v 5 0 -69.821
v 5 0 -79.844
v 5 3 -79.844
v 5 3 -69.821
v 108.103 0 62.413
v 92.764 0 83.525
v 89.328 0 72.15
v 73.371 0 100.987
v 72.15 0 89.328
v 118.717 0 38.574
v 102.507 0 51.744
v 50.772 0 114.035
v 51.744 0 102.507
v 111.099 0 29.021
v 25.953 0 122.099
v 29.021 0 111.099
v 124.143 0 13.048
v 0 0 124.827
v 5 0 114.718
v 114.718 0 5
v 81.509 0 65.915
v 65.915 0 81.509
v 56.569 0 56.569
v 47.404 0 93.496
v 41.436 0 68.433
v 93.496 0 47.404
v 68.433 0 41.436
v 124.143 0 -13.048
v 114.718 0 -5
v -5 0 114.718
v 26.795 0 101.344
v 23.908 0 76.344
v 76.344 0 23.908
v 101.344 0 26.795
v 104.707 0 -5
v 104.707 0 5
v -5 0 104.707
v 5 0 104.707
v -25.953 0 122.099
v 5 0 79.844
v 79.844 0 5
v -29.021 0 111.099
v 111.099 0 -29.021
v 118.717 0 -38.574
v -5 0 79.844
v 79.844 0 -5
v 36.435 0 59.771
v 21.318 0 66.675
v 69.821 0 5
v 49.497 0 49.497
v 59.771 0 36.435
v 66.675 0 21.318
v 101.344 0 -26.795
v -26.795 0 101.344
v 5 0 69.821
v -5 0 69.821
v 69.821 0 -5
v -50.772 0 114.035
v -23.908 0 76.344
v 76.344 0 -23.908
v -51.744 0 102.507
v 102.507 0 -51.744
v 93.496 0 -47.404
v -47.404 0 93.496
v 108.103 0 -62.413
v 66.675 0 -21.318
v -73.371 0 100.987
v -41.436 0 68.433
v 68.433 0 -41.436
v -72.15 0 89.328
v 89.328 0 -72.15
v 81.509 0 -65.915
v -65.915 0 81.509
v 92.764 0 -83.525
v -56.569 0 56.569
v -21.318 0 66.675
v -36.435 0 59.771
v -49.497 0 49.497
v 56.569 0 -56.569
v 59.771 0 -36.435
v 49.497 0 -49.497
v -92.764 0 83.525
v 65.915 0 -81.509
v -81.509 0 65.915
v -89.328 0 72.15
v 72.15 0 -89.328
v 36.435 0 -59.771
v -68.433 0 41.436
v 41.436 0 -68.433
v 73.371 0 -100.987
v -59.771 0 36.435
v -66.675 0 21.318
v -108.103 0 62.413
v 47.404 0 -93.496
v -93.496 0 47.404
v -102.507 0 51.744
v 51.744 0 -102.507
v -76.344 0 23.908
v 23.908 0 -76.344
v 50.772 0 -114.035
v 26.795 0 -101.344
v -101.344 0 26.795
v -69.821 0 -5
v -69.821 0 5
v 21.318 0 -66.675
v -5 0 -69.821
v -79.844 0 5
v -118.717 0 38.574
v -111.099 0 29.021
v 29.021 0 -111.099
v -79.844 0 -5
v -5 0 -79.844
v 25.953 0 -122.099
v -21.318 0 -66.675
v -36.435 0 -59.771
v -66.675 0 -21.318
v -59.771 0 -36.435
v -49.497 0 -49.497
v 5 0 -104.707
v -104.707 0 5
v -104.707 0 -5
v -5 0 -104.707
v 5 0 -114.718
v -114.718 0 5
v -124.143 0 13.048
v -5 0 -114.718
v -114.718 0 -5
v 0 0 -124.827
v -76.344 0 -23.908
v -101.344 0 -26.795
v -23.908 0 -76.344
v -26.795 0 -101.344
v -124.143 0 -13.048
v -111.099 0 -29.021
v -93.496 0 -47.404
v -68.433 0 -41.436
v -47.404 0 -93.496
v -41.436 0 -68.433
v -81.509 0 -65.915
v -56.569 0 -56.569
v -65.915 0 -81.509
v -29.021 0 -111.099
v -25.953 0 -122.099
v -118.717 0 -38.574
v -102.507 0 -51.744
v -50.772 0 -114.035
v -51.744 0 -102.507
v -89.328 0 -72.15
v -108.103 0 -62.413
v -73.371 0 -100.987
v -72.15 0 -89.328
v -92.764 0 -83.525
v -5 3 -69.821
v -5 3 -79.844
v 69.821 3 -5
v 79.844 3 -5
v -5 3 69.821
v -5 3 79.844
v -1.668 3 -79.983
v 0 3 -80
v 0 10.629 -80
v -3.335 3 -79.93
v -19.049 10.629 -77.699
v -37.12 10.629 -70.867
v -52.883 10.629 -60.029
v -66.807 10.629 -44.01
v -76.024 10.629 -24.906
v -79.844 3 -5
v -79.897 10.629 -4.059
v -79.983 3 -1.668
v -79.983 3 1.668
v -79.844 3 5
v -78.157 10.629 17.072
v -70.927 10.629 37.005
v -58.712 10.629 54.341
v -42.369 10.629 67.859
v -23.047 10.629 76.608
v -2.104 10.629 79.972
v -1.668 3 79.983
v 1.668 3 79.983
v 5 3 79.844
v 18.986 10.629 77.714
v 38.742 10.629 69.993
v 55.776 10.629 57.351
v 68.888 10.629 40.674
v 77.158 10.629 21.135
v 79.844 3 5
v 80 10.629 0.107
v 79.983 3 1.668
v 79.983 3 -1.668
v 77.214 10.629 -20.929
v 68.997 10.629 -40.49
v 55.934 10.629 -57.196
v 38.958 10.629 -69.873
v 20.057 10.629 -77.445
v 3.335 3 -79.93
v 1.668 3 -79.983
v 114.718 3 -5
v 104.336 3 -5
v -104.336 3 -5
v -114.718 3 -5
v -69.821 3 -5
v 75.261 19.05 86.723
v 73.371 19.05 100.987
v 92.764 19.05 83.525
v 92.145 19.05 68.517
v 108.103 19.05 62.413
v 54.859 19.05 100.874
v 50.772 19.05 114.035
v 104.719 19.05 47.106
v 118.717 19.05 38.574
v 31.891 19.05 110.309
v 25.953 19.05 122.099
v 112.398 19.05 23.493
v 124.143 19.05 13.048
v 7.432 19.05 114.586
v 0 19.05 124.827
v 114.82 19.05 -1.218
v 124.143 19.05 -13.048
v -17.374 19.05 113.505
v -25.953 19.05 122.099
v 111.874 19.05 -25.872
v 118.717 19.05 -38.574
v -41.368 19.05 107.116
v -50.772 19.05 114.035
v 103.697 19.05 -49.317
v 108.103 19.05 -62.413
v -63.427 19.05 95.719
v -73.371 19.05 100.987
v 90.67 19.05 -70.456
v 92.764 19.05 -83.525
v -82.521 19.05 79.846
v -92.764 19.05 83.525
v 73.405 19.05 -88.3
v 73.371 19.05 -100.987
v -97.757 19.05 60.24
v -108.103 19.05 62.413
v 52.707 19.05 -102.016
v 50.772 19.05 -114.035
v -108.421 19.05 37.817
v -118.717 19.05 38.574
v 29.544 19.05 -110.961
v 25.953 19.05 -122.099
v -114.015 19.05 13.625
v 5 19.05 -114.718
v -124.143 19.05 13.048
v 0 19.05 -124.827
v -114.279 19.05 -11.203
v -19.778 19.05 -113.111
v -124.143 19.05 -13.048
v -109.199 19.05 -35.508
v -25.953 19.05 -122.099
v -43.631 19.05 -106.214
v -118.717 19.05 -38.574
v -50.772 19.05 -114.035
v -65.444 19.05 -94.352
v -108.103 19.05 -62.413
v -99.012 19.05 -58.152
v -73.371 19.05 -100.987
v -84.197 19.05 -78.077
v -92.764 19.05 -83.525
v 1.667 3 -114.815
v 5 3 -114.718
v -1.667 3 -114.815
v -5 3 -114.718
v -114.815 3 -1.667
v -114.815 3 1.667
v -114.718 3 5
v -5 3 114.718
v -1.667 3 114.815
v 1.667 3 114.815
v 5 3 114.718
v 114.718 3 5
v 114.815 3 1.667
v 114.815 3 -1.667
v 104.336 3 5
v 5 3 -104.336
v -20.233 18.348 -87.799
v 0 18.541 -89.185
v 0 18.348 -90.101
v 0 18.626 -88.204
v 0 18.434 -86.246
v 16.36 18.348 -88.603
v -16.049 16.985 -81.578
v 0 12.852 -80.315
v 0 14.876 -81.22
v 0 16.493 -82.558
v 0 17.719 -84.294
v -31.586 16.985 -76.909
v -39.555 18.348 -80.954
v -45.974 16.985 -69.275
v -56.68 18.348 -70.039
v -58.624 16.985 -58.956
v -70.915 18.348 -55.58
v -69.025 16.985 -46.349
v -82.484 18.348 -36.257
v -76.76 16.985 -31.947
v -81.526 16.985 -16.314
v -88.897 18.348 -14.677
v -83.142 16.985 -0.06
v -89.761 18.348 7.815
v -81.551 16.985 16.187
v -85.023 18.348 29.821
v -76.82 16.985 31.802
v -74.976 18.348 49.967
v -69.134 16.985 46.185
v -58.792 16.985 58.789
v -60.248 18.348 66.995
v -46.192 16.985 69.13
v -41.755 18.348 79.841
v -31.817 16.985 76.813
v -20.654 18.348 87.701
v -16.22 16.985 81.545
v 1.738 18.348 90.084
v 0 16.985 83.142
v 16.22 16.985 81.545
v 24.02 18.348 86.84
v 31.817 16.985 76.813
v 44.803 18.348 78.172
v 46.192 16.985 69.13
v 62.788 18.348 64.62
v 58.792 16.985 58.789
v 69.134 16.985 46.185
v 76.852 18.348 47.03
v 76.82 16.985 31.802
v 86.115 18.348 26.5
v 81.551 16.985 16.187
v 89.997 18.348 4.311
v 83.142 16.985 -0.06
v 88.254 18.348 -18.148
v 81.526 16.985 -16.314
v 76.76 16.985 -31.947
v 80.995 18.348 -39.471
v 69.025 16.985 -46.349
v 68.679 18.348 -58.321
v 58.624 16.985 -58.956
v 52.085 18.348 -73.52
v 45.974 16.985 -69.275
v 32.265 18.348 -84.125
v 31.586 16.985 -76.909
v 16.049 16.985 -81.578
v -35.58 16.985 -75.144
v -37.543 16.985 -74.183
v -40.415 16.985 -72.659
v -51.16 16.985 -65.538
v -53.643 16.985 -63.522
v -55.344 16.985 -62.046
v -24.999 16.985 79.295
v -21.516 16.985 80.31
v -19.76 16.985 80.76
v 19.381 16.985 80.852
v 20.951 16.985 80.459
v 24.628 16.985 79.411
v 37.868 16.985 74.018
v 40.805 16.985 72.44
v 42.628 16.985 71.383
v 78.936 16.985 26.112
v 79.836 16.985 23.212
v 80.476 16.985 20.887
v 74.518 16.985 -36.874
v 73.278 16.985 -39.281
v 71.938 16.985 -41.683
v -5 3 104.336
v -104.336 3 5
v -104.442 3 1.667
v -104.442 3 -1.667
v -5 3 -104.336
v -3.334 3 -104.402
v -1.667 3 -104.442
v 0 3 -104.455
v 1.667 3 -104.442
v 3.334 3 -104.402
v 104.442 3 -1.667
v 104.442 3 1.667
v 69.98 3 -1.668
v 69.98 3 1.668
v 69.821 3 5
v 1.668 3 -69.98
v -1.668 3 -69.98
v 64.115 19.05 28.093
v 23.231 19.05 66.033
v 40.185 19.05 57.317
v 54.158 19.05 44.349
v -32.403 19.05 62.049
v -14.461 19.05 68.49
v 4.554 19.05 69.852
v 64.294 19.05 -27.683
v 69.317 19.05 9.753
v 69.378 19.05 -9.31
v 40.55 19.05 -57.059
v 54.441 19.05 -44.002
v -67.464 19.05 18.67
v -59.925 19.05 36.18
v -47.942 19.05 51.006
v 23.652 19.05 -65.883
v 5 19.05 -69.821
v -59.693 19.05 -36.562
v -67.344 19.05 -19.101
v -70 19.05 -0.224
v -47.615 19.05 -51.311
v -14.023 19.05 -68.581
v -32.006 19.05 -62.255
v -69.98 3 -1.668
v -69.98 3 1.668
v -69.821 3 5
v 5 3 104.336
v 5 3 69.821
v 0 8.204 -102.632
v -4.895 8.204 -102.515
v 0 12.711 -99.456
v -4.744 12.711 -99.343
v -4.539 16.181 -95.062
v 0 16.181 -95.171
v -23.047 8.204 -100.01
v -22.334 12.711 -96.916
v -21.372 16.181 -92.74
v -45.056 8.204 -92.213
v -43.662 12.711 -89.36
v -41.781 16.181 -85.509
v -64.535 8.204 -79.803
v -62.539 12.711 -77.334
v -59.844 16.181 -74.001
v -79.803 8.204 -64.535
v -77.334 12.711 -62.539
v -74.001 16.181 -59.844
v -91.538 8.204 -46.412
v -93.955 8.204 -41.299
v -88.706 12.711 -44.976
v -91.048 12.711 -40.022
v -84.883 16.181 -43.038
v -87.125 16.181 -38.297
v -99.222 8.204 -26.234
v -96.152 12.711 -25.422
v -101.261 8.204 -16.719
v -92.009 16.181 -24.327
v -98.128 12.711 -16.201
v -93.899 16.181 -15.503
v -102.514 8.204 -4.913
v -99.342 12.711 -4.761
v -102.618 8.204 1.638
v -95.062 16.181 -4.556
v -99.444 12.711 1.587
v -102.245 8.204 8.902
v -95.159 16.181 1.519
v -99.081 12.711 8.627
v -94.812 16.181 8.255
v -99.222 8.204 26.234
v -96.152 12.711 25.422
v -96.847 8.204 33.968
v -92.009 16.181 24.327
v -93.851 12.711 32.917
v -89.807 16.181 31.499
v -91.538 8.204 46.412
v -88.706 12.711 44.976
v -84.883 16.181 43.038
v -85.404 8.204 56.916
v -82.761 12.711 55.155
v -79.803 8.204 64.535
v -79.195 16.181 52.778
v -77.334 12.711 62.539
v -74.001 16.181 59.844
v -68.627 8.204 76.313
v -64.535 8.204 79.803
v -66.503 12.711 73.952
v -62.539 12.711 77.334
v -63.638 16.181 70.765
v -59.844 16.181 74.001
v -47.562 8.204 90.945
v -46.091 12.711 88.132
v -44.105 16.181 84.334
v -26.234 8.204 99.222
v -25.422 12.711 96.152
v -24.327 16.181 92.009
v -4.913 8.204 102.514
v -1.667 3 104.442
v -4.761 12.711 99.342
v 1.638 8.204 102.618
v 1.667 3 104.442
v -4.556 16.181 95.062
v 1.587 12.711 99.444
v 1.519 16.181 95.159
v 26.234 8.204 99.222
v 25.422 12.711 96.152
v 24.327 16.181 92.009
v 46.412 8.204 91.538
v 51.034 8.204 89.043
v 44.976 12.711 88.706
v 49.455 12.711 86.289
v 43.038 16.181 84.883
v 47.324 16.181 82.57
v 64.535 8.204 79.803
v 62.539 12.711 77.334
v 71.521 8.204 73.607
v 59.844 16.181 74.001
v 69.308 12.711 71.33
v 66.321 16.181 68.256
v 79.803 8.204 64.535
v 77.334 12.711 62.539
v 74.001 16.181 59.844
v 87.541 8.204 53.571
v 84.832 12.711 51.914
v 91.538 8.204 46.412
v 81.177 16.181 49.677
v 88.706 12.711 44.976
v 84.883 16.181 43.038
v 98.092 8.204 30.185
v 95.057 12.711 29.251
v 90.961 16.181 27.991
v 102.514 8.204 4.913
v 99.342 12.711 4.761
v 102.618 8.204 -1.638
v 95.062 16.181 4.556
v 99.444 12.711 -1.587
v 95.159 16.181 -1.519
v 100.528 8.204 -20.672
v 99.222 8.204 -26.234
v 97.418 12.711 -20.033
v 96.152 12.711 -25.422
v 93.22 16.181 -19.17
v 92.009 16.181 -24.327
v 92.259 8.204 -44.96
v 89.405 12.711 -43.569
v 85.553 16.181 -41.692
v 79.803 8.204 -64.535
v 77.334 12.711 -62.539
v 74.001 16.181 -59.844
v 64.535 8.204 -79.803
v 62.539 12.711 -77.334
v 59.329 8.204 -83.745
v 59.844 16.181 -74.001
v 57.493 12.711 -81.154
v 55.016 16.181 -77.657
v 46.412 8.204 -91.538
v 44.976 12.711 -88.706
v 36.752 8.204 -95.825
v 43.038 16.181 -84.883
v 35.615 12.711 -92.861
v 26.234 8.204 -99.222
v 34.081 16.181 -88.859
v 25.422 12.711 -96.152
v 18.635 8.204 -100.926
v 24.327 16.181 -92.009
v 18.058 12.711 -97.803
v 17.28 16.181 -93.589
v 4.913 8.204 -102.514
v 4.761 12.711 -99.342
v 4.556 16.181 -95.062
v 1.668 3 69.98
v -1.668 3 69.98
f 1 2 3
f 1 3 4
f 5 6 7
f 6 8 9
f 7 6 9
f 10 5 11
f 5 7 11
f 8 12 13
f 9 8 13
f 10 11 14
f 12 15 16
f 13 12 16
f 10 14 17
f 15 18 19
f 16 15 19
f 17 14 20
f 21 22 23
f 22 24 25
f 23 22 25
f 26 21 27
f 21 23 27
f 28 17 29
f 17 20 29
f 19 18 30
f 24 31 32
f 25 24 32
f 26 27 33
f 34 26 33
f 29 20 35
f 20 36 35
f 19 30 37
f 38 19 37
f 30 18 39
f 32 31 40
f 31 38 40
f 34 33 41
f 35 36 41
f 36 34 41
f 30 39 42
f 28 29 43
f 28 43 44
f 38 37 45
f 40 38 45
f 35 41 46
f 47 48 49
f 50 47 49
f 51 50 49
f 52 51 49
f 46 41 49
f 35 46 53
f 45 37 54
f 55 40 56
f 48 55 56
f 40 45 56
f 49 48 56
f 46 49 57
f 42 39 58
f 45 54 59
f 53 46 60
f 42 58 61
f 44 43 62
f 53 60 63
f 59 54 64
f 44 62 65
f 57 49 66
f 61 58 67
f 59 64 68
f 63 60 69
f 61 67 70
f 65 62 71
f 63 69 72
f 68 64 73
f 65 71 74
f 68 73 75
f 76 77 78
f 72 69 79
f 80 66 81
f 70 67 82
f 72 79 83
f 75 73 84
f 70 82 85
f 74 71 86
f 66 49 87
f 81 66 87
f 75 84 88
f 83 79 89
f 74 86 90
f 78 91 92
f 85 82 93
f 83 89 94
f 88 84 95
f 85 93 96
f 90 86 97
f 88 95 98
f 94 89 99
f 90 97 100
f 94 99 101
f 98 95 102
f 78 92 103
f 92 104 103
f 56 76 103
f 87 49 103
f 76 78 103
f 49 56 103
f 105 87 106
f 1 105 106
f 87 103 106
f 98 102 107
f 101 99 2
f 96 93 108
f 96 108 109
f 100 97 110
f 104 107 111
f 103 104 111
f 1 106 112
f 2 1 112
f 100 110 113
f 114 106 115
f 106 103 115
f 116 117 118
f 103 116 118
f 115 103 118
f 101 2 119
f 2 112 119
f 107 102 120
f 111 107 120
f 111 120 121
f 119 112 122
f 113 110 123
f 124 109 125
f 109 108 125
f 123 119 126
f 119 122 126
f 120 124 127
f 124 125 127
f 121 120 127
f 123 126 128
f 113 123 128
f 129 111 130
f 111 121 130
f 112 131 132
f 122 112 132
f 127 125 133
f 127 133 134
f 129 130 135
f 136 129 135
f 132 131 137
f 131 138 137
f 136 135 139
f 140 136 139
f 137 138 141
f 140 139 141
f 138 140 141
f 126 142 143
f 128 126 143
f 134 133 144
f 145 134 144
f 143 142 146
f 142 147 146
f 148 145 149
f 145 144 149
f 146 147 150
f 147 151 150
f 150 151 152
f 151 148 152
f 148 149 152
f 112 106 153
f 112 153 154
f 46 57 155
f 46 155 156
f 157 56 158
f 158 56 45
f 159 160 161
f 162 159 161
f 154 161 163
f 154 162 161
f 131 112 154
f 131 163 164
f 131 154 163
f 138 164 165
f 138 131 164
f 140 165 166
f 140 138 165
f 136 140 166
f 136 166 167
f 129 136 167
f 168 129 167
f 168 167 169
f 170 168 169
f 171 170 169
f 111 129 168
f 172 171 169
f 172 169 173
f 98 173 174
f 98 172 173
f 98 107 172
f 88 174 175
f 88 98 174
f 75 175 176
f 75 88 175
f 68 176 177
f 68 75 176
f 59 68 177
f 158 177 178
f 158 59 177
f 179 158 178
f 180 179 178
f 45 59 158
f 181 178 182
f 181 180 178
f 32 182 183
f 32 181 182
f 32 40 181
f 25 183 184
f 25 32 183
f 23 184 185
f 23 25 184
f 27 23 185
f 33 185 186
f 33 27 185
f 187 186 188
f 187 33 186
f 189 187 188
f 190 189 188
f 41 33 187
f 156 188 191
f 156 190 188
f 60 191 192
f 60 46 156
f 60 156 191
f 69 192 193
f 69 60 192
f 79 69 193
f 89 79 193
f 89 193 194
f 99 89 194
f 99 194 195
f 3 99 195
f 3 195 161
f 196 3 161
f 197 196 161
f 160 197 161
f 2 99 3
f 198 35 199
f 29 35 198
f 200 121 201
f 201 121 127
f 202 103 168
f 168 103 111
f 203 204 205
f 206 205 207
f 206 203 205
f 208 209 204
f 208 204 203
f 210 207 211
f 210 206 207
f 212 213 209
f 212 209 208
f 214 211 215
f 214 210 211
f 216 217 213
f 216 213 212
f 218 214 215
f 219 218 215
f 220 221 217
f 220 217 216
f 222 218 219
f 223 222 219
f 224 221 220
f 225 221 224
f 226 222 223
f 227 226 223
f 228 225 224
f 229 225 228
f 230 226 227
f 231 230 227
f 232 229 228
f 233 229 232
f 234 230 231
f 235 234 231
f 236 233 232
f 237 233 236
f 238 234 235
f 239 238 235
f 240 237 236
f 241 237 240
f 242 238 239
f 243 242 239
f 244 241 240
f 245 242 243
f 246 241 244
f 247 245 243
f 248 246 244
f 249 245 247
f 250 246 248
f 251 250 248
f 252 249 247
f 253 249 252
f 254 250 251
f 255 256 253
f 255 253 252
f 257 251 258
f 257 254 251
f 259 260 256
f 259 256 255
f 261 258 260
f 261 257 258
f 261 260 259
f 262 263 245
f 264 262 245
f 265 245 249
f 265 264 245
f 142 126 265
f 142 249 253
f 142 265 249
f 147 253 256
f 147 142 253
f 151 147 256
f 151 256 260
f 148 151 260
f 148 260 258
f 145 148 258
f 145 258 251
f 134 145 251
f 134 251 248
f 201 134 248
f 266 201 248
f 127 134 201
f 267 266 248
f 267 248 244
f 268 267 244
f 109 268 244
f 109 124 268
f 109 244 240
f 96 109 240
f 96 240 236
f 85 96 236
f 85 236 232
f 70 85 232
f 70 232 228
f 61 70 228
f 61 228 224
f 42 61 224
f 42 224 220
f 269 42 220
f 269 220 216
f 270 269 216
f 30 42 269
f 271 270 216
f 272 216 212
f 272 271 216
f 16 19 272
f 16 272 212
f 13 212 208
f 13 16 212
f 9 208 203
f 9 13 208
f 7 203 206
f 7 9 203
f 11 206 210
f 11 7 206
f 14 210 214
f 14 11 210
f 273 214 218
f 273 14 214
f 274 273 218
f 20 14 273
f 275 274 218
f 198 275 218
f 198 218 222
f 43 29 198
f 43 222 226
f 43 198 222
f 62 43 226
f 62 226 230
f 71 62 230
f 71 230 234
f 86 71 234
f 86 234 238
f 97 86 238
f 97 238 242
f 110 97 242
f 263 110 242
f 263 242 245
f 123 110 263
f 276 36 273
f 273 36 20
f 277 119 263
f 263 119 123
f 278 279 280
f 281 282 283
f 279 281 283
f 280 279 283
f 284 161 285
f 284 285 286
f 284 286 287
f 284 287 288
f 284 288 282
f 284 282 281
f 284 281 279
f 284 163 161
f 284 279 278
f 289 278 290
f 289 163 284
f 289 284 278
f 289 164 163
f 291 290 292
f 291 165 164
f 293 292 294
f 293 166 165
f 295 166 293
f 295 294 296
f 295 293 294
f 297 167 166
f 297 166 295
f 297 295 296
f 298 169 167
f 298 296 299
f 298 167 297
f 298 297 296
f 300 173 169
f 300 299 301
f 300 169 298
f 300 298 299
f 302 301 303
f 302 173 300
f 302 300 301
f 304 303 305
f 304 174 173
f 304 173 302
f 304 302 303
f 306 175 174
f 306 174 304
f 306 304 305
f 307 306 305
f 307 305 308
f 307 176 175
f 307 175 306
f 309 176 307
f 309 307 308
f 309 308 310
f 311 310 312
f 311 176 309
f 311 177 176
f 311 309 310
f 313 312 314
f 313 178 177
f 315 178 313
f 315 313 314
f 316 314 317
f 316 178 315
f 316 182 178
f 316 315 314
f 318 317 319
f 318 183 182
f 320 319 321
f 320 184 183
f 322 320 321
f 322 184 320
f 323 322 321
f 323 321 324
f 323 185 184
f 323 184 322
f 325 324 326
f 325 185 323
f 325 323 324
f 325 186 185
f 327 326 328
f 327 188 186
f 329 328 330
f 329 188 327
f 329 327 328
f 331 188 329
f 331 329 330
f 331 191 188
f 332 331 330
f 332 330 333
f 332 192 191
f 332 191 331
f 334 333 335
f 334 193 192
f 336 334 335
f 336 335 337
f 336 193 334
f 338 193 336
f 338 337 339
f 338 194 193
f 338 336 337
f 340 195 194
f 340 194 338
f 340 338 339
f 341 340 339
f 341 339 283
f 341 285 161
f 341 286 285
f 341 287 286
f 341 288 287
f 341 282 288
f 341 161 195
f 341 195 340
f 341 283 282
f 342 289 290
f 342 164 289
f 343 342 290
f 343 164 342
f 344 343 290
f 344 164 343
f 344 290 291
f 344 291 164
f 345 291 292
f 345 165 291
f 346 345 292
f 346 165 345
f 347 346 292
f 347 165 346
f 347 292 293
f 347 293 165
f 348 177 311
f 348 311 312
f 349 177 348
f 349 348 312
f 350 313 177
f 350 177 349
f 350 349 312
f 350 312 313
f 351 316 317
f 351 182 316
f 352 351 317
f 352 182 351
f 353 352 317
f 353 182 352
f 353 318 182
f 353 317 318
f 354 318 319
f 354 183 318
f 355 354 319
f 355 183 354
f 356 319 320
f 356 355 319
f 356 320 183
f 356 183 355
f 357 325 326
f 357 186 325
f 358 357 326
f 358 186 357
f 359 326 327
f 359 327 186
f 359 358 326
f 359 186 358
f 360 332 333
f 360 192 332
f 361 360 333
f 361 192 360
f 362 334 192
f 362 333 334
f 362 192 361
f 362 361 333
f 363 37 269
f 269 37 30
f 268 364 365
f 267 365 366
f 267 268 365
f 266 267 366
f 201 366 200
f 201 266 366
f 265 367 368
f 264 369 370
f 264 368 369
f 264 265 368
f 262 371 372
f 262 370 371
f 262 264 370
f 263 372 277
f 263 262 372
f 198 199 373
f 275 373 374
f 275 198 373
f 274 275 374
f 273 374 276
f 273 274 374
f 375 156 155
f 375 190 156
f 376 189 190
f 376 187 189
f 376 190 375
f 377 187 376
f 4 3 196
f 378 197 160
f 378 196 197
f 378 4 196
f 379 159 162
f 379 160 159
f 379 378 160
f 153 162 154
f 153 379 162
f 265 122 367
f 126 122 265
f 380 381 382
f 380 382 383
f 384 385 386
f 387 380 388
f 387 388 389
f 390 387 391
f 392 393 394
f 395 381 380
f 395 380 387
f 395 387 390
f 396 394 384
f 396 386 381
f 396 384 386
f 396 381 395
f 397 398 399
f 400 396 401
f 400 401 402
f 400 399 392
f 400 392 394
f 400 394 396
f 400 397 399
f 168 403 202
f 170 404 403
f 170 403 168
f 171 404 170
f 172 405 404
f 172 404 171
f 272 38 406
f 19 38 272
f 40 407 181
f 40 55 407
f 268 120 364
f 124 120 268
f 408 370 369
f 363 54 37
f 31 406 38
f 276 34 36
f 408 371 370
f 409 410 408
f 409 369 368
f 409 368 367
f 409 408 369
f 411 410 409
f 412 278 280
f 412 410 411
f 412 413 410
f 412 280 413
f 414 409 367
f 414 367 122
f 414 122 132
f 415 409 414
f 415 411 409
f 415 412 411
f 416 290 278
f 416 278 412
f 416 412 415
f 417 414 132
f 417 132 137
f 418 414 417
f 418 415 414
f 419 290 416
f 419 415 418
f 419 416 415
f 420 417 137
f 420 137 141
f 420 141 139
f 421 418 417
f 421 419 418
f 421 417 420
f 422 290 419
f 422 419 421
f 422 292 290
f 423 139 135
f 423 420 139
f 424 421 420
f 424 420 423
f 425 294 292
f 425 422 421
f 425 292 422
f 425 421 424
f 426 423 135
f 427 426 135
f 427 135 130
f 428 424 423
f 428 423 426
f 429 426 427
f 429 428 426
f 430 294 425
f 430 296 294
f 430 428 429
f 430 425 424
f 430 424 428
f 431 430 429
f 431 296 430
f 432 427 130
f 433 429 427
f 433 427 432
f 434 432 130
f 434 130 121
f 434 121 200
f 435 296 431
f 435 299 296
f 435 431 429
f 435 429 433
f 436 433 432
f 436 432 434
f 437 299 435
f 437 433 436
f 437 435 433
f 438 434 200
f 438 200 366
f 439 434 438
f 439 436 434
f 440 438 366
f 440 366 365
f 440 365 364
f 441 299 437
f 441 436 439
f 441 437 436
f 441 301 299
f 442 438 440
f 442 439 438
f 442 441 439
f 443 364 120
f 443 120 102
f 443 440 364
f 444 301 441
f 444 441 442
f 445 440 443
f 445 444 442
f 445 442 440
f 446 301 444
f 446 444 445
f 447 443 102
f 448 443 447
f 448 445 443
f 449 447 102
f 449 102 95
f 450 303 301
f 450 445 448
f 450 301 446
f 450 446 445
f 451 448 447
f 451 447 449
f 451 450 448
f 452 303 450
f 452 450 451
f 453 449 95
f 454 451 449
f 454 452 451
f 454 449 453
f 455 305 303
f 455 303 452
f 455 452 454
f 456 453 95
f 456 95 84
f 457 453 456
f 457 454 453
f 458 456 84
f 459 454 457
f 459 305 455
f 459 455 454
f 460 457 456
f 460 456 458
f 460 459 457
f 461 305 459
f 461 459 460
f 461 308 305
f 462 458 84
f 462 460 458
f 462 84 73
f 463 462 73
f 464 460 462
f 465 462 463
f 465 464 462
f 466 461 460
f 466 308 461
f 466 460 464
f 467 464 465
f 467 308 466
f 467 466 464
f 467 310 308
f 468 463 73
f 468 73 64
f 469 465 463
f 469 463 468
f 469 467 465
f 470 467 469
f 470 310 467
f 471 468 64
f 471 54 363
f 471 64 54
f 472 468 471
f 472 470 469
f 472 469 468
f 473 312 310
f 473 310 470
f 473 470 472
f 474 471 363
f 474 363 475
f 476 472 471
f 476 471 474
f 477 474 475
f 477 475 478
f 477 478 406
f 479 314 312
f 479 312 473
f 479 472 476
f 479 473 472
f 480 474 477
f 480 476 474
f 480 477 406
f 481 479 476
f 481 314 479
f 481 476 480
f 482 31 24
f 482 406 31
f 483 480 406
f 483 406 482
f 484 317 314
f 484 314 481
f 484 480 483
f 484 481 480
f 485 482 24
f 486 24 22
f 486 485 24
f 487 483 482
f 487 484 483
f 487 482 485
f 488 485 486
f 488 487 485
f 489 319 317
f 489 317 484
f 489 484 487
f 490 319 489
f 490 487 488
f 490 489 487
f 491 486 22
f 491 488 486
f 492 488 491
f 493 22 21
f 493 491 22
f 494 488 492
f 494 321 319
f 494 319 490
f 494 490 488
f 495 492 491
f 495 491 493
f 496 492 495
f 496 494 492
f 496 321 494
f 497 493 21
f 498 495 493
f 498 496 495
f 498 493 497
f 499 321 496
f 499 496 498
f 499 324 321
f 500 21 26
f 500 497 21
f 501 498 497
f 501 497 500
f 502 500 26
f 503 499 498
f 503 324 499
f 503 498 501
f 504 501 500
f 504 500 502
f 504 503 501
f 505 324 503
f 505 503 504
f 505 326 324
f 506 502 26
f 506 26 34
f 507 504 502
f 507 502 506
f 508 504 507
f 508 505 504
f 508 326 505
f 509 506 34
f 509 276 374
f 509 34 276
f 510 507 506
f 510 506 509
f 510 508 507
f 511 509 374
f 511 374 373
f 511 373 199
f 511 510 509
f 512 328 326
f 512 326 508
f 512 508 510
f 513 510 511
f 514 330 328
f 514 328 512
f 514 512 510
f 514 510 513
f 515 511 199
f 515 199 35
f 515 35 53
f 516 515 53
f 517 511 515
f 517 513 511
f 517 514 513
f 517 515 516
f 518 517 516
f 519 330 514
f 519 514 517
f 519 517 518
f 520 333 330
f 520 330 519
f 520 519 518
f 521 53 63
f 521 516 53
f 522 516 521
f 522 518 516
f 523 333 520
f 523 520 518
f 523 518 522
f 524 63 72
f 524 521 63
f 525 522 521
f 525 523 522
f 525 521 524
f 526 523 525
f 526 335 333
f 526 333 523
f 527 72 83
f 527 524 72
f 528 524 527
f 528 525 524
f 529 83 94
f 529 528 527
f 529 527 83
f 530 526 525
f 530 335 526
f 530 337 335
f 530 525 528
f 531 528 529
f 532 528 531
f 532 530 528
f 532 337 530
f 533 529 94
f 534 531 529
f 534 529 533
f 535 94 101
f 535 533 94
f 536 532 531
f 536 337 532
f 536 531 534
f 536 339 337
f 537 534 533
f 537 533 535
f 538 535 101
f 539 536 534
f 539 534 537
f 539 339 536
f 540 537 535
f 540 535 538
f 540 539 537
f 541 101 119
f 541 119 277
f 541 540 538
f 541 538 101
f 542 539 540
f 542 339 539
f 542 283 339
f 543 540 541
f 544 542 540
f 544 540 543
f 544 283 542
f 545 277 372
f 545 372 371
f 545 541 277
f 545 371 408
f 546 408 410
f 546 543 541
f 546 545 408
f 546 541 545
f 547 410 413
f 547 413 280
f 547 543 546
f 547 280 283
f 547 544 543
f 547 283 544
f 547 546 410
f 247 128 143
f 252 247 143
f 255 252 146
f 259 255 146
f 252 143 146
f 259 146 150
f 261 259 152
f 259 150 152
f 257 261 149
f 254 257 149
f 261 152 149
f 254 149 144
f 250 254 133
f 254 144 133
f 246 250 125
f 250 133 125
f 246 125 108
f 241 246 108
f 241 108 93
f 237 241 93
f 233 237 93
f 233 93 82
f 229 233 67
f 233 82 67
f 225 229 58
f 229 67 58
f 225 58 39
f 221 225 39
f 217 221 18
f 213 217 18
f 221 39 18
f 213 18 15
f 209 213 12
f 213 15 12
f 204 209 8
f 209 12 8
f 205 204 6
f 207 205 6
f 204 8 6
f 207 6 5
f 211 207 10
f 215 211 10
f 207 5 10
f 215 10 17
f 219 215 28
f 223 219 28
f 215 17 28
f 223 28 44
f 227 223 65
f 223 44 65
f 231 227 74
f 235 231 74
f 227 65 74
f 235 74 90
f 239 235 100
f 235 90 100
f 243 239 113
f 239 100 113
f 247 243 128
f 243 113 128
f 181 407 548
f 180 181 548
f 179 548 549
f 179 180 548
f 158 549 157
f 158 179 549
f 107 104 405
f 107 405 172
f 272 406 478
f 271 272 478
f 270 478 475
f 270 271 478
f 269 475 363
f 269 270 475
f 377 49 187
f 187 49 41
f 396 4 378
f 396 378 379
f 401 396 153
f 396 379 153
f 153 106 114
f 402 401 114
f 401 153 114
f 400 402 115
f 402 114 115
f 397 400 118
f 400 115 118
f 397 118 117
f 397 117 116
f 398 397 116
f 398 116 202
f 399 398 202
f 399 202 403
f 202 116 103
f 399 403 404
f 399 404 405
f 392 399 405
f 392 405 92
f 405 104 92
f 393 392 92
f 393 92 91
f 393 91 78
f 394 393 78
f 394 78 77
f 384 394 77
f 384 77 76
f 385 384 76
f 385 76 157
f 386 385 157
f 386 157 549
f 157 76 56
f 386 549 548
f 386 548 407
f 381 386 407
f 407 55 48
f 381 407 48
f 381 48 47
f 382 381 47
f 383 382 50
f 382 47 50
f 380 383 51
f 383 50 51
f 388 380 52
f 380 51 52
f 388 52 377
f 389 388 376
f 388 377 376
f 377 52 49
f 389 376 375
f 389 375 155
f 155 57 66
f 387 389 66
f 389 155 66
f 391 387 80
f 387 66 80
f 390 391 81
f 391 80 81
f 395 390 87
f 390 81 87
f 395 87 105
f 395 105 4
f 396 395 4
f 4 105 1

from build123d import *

# Parameters (mm, degrees)
SKETCH1_R           = 105
SKETCH1_R_2         = 80
BOSS_EXTRUDE1_DEPTH = 19.05
FILLET4_R           = 8
SKETCH6_W           = 10
SKETCH6_H           = 114.826624275
BOSS_EXTRUDE2_DEPTH = 3
CIRPATTERN2_COUNT   = 4
SKETCH5_R           = 124.826624275
SKETCH5_R_2         = 114.826624275
SKETCH5_R_3         = 70
BOSS_EXTRUDE3_DEPTH = 19.05


with BuildPart() as part:
    # Sketch1 → Boss-Extrude1 (new body)
    with BuildSketch(Plane(origin=(0, 0, 0), x_dir=(1, 0, 0), z_dir=(0, 1, 0))):
        with Locations(Location((0, 0, 0), (0, 0, 90))):
            Circle(SKETCH1_R)
        with Locations(Location((0, 0, 0), (0, 0, 90))):
            Circle(SKETCH1_R_2, mode=Mode.SUBTRACT)
    extrude(amount=BOSS_EXTRUDE1_DEPTH)

    # Sketch3 → Cut-Revolve1 (revolve, cut)
    with BuildSketch(Plane.XY, mode=Mode.PRIVATE) as cut_revolve1_sk:
        with BuildLine():
            Line((-84.849199516, 19.05), (-84.849199516, 24.05))
            Line((-84.849199516, 24.05), (-110, 24.05))
            Line((-110, 24.05), (-110, 0))
            Line((-110, 0), (-104.826624275, 0))
            ThreePointArc((-104.826624275, 0), (-98.651373258, 13.524114826), (-84.849199516, 19.05))
        make_face()
    revolve(cut_revolve1_sk.sketch.rotate(Axis((0, 0, 0), (0, 1, 0)), 270), axis=Axis((0, 0, 0), (0, 1, 0)), mode=Mode.SUBTRACT)

    # Fillet4
    fillet4_edges = [part.edges().sort_by_distance(p)[0] for p in [
        (0, 19.05, 80),
    ]]
    fillet(fillet4_edges, radius=FILLET4_R)

    # Sketch6 → Boss-Extrude2 (add)
    with BuildSketch(Plane(origin=(0, 0, 0), x_dir=(1, 0, 0), z_dir=(0, 1, 0))):
        with Locations((0, 57.413312138)):
            Rectangle(SKETCH6_W, SKETCH6_H)
    boss_extrude2 = extrude(amount=BOSS_EXTRUDE2_DEPTH)

    # CirPattern2: Boss-Extrude2 ×4 about axis
    cirpattern2_axis = Axis((0, 0, 0), (0, 1, 0))
    for i in range(1, CIRPATTERN2_COUNT):
        add(boss_extrude2.rotate(cirpattern2_axis, i * 360 / CIRPATTERN2_COUNT))

    # Sketch5 → Boss-Extrude3 (add)
    # profile 1 of 2: a face of its own
    with BuildSketch(Plane(origin=(0, 0, 0), x_dir=(1, 0, 0), z_dir=(0, 1, 0))):
        with Locations(Location((0, 0, 0), (0, 0, 90))):
            Circle(SKETCH5_R)
        with Locations(Location((0, 0, 0), (0, 0, 87.504328744))):
            Circle(SKETCH5_R_2, mode=Mode.SUBTRACT)
    # profile 2 of 2: a face of its own
    with BuildSketch(Plane(origin=(0, 0, 0), x_dir=(1, 0, 0), z_dir=(0, 1, 0))):
        with Locations(Location((0, 0, 0), (0, 0, 85.903956242))):
            Circle(SKETCH5_R_3)
    extrude(amount=BOSS_EXTRUDE3_DEPTH)


solid = part.part
